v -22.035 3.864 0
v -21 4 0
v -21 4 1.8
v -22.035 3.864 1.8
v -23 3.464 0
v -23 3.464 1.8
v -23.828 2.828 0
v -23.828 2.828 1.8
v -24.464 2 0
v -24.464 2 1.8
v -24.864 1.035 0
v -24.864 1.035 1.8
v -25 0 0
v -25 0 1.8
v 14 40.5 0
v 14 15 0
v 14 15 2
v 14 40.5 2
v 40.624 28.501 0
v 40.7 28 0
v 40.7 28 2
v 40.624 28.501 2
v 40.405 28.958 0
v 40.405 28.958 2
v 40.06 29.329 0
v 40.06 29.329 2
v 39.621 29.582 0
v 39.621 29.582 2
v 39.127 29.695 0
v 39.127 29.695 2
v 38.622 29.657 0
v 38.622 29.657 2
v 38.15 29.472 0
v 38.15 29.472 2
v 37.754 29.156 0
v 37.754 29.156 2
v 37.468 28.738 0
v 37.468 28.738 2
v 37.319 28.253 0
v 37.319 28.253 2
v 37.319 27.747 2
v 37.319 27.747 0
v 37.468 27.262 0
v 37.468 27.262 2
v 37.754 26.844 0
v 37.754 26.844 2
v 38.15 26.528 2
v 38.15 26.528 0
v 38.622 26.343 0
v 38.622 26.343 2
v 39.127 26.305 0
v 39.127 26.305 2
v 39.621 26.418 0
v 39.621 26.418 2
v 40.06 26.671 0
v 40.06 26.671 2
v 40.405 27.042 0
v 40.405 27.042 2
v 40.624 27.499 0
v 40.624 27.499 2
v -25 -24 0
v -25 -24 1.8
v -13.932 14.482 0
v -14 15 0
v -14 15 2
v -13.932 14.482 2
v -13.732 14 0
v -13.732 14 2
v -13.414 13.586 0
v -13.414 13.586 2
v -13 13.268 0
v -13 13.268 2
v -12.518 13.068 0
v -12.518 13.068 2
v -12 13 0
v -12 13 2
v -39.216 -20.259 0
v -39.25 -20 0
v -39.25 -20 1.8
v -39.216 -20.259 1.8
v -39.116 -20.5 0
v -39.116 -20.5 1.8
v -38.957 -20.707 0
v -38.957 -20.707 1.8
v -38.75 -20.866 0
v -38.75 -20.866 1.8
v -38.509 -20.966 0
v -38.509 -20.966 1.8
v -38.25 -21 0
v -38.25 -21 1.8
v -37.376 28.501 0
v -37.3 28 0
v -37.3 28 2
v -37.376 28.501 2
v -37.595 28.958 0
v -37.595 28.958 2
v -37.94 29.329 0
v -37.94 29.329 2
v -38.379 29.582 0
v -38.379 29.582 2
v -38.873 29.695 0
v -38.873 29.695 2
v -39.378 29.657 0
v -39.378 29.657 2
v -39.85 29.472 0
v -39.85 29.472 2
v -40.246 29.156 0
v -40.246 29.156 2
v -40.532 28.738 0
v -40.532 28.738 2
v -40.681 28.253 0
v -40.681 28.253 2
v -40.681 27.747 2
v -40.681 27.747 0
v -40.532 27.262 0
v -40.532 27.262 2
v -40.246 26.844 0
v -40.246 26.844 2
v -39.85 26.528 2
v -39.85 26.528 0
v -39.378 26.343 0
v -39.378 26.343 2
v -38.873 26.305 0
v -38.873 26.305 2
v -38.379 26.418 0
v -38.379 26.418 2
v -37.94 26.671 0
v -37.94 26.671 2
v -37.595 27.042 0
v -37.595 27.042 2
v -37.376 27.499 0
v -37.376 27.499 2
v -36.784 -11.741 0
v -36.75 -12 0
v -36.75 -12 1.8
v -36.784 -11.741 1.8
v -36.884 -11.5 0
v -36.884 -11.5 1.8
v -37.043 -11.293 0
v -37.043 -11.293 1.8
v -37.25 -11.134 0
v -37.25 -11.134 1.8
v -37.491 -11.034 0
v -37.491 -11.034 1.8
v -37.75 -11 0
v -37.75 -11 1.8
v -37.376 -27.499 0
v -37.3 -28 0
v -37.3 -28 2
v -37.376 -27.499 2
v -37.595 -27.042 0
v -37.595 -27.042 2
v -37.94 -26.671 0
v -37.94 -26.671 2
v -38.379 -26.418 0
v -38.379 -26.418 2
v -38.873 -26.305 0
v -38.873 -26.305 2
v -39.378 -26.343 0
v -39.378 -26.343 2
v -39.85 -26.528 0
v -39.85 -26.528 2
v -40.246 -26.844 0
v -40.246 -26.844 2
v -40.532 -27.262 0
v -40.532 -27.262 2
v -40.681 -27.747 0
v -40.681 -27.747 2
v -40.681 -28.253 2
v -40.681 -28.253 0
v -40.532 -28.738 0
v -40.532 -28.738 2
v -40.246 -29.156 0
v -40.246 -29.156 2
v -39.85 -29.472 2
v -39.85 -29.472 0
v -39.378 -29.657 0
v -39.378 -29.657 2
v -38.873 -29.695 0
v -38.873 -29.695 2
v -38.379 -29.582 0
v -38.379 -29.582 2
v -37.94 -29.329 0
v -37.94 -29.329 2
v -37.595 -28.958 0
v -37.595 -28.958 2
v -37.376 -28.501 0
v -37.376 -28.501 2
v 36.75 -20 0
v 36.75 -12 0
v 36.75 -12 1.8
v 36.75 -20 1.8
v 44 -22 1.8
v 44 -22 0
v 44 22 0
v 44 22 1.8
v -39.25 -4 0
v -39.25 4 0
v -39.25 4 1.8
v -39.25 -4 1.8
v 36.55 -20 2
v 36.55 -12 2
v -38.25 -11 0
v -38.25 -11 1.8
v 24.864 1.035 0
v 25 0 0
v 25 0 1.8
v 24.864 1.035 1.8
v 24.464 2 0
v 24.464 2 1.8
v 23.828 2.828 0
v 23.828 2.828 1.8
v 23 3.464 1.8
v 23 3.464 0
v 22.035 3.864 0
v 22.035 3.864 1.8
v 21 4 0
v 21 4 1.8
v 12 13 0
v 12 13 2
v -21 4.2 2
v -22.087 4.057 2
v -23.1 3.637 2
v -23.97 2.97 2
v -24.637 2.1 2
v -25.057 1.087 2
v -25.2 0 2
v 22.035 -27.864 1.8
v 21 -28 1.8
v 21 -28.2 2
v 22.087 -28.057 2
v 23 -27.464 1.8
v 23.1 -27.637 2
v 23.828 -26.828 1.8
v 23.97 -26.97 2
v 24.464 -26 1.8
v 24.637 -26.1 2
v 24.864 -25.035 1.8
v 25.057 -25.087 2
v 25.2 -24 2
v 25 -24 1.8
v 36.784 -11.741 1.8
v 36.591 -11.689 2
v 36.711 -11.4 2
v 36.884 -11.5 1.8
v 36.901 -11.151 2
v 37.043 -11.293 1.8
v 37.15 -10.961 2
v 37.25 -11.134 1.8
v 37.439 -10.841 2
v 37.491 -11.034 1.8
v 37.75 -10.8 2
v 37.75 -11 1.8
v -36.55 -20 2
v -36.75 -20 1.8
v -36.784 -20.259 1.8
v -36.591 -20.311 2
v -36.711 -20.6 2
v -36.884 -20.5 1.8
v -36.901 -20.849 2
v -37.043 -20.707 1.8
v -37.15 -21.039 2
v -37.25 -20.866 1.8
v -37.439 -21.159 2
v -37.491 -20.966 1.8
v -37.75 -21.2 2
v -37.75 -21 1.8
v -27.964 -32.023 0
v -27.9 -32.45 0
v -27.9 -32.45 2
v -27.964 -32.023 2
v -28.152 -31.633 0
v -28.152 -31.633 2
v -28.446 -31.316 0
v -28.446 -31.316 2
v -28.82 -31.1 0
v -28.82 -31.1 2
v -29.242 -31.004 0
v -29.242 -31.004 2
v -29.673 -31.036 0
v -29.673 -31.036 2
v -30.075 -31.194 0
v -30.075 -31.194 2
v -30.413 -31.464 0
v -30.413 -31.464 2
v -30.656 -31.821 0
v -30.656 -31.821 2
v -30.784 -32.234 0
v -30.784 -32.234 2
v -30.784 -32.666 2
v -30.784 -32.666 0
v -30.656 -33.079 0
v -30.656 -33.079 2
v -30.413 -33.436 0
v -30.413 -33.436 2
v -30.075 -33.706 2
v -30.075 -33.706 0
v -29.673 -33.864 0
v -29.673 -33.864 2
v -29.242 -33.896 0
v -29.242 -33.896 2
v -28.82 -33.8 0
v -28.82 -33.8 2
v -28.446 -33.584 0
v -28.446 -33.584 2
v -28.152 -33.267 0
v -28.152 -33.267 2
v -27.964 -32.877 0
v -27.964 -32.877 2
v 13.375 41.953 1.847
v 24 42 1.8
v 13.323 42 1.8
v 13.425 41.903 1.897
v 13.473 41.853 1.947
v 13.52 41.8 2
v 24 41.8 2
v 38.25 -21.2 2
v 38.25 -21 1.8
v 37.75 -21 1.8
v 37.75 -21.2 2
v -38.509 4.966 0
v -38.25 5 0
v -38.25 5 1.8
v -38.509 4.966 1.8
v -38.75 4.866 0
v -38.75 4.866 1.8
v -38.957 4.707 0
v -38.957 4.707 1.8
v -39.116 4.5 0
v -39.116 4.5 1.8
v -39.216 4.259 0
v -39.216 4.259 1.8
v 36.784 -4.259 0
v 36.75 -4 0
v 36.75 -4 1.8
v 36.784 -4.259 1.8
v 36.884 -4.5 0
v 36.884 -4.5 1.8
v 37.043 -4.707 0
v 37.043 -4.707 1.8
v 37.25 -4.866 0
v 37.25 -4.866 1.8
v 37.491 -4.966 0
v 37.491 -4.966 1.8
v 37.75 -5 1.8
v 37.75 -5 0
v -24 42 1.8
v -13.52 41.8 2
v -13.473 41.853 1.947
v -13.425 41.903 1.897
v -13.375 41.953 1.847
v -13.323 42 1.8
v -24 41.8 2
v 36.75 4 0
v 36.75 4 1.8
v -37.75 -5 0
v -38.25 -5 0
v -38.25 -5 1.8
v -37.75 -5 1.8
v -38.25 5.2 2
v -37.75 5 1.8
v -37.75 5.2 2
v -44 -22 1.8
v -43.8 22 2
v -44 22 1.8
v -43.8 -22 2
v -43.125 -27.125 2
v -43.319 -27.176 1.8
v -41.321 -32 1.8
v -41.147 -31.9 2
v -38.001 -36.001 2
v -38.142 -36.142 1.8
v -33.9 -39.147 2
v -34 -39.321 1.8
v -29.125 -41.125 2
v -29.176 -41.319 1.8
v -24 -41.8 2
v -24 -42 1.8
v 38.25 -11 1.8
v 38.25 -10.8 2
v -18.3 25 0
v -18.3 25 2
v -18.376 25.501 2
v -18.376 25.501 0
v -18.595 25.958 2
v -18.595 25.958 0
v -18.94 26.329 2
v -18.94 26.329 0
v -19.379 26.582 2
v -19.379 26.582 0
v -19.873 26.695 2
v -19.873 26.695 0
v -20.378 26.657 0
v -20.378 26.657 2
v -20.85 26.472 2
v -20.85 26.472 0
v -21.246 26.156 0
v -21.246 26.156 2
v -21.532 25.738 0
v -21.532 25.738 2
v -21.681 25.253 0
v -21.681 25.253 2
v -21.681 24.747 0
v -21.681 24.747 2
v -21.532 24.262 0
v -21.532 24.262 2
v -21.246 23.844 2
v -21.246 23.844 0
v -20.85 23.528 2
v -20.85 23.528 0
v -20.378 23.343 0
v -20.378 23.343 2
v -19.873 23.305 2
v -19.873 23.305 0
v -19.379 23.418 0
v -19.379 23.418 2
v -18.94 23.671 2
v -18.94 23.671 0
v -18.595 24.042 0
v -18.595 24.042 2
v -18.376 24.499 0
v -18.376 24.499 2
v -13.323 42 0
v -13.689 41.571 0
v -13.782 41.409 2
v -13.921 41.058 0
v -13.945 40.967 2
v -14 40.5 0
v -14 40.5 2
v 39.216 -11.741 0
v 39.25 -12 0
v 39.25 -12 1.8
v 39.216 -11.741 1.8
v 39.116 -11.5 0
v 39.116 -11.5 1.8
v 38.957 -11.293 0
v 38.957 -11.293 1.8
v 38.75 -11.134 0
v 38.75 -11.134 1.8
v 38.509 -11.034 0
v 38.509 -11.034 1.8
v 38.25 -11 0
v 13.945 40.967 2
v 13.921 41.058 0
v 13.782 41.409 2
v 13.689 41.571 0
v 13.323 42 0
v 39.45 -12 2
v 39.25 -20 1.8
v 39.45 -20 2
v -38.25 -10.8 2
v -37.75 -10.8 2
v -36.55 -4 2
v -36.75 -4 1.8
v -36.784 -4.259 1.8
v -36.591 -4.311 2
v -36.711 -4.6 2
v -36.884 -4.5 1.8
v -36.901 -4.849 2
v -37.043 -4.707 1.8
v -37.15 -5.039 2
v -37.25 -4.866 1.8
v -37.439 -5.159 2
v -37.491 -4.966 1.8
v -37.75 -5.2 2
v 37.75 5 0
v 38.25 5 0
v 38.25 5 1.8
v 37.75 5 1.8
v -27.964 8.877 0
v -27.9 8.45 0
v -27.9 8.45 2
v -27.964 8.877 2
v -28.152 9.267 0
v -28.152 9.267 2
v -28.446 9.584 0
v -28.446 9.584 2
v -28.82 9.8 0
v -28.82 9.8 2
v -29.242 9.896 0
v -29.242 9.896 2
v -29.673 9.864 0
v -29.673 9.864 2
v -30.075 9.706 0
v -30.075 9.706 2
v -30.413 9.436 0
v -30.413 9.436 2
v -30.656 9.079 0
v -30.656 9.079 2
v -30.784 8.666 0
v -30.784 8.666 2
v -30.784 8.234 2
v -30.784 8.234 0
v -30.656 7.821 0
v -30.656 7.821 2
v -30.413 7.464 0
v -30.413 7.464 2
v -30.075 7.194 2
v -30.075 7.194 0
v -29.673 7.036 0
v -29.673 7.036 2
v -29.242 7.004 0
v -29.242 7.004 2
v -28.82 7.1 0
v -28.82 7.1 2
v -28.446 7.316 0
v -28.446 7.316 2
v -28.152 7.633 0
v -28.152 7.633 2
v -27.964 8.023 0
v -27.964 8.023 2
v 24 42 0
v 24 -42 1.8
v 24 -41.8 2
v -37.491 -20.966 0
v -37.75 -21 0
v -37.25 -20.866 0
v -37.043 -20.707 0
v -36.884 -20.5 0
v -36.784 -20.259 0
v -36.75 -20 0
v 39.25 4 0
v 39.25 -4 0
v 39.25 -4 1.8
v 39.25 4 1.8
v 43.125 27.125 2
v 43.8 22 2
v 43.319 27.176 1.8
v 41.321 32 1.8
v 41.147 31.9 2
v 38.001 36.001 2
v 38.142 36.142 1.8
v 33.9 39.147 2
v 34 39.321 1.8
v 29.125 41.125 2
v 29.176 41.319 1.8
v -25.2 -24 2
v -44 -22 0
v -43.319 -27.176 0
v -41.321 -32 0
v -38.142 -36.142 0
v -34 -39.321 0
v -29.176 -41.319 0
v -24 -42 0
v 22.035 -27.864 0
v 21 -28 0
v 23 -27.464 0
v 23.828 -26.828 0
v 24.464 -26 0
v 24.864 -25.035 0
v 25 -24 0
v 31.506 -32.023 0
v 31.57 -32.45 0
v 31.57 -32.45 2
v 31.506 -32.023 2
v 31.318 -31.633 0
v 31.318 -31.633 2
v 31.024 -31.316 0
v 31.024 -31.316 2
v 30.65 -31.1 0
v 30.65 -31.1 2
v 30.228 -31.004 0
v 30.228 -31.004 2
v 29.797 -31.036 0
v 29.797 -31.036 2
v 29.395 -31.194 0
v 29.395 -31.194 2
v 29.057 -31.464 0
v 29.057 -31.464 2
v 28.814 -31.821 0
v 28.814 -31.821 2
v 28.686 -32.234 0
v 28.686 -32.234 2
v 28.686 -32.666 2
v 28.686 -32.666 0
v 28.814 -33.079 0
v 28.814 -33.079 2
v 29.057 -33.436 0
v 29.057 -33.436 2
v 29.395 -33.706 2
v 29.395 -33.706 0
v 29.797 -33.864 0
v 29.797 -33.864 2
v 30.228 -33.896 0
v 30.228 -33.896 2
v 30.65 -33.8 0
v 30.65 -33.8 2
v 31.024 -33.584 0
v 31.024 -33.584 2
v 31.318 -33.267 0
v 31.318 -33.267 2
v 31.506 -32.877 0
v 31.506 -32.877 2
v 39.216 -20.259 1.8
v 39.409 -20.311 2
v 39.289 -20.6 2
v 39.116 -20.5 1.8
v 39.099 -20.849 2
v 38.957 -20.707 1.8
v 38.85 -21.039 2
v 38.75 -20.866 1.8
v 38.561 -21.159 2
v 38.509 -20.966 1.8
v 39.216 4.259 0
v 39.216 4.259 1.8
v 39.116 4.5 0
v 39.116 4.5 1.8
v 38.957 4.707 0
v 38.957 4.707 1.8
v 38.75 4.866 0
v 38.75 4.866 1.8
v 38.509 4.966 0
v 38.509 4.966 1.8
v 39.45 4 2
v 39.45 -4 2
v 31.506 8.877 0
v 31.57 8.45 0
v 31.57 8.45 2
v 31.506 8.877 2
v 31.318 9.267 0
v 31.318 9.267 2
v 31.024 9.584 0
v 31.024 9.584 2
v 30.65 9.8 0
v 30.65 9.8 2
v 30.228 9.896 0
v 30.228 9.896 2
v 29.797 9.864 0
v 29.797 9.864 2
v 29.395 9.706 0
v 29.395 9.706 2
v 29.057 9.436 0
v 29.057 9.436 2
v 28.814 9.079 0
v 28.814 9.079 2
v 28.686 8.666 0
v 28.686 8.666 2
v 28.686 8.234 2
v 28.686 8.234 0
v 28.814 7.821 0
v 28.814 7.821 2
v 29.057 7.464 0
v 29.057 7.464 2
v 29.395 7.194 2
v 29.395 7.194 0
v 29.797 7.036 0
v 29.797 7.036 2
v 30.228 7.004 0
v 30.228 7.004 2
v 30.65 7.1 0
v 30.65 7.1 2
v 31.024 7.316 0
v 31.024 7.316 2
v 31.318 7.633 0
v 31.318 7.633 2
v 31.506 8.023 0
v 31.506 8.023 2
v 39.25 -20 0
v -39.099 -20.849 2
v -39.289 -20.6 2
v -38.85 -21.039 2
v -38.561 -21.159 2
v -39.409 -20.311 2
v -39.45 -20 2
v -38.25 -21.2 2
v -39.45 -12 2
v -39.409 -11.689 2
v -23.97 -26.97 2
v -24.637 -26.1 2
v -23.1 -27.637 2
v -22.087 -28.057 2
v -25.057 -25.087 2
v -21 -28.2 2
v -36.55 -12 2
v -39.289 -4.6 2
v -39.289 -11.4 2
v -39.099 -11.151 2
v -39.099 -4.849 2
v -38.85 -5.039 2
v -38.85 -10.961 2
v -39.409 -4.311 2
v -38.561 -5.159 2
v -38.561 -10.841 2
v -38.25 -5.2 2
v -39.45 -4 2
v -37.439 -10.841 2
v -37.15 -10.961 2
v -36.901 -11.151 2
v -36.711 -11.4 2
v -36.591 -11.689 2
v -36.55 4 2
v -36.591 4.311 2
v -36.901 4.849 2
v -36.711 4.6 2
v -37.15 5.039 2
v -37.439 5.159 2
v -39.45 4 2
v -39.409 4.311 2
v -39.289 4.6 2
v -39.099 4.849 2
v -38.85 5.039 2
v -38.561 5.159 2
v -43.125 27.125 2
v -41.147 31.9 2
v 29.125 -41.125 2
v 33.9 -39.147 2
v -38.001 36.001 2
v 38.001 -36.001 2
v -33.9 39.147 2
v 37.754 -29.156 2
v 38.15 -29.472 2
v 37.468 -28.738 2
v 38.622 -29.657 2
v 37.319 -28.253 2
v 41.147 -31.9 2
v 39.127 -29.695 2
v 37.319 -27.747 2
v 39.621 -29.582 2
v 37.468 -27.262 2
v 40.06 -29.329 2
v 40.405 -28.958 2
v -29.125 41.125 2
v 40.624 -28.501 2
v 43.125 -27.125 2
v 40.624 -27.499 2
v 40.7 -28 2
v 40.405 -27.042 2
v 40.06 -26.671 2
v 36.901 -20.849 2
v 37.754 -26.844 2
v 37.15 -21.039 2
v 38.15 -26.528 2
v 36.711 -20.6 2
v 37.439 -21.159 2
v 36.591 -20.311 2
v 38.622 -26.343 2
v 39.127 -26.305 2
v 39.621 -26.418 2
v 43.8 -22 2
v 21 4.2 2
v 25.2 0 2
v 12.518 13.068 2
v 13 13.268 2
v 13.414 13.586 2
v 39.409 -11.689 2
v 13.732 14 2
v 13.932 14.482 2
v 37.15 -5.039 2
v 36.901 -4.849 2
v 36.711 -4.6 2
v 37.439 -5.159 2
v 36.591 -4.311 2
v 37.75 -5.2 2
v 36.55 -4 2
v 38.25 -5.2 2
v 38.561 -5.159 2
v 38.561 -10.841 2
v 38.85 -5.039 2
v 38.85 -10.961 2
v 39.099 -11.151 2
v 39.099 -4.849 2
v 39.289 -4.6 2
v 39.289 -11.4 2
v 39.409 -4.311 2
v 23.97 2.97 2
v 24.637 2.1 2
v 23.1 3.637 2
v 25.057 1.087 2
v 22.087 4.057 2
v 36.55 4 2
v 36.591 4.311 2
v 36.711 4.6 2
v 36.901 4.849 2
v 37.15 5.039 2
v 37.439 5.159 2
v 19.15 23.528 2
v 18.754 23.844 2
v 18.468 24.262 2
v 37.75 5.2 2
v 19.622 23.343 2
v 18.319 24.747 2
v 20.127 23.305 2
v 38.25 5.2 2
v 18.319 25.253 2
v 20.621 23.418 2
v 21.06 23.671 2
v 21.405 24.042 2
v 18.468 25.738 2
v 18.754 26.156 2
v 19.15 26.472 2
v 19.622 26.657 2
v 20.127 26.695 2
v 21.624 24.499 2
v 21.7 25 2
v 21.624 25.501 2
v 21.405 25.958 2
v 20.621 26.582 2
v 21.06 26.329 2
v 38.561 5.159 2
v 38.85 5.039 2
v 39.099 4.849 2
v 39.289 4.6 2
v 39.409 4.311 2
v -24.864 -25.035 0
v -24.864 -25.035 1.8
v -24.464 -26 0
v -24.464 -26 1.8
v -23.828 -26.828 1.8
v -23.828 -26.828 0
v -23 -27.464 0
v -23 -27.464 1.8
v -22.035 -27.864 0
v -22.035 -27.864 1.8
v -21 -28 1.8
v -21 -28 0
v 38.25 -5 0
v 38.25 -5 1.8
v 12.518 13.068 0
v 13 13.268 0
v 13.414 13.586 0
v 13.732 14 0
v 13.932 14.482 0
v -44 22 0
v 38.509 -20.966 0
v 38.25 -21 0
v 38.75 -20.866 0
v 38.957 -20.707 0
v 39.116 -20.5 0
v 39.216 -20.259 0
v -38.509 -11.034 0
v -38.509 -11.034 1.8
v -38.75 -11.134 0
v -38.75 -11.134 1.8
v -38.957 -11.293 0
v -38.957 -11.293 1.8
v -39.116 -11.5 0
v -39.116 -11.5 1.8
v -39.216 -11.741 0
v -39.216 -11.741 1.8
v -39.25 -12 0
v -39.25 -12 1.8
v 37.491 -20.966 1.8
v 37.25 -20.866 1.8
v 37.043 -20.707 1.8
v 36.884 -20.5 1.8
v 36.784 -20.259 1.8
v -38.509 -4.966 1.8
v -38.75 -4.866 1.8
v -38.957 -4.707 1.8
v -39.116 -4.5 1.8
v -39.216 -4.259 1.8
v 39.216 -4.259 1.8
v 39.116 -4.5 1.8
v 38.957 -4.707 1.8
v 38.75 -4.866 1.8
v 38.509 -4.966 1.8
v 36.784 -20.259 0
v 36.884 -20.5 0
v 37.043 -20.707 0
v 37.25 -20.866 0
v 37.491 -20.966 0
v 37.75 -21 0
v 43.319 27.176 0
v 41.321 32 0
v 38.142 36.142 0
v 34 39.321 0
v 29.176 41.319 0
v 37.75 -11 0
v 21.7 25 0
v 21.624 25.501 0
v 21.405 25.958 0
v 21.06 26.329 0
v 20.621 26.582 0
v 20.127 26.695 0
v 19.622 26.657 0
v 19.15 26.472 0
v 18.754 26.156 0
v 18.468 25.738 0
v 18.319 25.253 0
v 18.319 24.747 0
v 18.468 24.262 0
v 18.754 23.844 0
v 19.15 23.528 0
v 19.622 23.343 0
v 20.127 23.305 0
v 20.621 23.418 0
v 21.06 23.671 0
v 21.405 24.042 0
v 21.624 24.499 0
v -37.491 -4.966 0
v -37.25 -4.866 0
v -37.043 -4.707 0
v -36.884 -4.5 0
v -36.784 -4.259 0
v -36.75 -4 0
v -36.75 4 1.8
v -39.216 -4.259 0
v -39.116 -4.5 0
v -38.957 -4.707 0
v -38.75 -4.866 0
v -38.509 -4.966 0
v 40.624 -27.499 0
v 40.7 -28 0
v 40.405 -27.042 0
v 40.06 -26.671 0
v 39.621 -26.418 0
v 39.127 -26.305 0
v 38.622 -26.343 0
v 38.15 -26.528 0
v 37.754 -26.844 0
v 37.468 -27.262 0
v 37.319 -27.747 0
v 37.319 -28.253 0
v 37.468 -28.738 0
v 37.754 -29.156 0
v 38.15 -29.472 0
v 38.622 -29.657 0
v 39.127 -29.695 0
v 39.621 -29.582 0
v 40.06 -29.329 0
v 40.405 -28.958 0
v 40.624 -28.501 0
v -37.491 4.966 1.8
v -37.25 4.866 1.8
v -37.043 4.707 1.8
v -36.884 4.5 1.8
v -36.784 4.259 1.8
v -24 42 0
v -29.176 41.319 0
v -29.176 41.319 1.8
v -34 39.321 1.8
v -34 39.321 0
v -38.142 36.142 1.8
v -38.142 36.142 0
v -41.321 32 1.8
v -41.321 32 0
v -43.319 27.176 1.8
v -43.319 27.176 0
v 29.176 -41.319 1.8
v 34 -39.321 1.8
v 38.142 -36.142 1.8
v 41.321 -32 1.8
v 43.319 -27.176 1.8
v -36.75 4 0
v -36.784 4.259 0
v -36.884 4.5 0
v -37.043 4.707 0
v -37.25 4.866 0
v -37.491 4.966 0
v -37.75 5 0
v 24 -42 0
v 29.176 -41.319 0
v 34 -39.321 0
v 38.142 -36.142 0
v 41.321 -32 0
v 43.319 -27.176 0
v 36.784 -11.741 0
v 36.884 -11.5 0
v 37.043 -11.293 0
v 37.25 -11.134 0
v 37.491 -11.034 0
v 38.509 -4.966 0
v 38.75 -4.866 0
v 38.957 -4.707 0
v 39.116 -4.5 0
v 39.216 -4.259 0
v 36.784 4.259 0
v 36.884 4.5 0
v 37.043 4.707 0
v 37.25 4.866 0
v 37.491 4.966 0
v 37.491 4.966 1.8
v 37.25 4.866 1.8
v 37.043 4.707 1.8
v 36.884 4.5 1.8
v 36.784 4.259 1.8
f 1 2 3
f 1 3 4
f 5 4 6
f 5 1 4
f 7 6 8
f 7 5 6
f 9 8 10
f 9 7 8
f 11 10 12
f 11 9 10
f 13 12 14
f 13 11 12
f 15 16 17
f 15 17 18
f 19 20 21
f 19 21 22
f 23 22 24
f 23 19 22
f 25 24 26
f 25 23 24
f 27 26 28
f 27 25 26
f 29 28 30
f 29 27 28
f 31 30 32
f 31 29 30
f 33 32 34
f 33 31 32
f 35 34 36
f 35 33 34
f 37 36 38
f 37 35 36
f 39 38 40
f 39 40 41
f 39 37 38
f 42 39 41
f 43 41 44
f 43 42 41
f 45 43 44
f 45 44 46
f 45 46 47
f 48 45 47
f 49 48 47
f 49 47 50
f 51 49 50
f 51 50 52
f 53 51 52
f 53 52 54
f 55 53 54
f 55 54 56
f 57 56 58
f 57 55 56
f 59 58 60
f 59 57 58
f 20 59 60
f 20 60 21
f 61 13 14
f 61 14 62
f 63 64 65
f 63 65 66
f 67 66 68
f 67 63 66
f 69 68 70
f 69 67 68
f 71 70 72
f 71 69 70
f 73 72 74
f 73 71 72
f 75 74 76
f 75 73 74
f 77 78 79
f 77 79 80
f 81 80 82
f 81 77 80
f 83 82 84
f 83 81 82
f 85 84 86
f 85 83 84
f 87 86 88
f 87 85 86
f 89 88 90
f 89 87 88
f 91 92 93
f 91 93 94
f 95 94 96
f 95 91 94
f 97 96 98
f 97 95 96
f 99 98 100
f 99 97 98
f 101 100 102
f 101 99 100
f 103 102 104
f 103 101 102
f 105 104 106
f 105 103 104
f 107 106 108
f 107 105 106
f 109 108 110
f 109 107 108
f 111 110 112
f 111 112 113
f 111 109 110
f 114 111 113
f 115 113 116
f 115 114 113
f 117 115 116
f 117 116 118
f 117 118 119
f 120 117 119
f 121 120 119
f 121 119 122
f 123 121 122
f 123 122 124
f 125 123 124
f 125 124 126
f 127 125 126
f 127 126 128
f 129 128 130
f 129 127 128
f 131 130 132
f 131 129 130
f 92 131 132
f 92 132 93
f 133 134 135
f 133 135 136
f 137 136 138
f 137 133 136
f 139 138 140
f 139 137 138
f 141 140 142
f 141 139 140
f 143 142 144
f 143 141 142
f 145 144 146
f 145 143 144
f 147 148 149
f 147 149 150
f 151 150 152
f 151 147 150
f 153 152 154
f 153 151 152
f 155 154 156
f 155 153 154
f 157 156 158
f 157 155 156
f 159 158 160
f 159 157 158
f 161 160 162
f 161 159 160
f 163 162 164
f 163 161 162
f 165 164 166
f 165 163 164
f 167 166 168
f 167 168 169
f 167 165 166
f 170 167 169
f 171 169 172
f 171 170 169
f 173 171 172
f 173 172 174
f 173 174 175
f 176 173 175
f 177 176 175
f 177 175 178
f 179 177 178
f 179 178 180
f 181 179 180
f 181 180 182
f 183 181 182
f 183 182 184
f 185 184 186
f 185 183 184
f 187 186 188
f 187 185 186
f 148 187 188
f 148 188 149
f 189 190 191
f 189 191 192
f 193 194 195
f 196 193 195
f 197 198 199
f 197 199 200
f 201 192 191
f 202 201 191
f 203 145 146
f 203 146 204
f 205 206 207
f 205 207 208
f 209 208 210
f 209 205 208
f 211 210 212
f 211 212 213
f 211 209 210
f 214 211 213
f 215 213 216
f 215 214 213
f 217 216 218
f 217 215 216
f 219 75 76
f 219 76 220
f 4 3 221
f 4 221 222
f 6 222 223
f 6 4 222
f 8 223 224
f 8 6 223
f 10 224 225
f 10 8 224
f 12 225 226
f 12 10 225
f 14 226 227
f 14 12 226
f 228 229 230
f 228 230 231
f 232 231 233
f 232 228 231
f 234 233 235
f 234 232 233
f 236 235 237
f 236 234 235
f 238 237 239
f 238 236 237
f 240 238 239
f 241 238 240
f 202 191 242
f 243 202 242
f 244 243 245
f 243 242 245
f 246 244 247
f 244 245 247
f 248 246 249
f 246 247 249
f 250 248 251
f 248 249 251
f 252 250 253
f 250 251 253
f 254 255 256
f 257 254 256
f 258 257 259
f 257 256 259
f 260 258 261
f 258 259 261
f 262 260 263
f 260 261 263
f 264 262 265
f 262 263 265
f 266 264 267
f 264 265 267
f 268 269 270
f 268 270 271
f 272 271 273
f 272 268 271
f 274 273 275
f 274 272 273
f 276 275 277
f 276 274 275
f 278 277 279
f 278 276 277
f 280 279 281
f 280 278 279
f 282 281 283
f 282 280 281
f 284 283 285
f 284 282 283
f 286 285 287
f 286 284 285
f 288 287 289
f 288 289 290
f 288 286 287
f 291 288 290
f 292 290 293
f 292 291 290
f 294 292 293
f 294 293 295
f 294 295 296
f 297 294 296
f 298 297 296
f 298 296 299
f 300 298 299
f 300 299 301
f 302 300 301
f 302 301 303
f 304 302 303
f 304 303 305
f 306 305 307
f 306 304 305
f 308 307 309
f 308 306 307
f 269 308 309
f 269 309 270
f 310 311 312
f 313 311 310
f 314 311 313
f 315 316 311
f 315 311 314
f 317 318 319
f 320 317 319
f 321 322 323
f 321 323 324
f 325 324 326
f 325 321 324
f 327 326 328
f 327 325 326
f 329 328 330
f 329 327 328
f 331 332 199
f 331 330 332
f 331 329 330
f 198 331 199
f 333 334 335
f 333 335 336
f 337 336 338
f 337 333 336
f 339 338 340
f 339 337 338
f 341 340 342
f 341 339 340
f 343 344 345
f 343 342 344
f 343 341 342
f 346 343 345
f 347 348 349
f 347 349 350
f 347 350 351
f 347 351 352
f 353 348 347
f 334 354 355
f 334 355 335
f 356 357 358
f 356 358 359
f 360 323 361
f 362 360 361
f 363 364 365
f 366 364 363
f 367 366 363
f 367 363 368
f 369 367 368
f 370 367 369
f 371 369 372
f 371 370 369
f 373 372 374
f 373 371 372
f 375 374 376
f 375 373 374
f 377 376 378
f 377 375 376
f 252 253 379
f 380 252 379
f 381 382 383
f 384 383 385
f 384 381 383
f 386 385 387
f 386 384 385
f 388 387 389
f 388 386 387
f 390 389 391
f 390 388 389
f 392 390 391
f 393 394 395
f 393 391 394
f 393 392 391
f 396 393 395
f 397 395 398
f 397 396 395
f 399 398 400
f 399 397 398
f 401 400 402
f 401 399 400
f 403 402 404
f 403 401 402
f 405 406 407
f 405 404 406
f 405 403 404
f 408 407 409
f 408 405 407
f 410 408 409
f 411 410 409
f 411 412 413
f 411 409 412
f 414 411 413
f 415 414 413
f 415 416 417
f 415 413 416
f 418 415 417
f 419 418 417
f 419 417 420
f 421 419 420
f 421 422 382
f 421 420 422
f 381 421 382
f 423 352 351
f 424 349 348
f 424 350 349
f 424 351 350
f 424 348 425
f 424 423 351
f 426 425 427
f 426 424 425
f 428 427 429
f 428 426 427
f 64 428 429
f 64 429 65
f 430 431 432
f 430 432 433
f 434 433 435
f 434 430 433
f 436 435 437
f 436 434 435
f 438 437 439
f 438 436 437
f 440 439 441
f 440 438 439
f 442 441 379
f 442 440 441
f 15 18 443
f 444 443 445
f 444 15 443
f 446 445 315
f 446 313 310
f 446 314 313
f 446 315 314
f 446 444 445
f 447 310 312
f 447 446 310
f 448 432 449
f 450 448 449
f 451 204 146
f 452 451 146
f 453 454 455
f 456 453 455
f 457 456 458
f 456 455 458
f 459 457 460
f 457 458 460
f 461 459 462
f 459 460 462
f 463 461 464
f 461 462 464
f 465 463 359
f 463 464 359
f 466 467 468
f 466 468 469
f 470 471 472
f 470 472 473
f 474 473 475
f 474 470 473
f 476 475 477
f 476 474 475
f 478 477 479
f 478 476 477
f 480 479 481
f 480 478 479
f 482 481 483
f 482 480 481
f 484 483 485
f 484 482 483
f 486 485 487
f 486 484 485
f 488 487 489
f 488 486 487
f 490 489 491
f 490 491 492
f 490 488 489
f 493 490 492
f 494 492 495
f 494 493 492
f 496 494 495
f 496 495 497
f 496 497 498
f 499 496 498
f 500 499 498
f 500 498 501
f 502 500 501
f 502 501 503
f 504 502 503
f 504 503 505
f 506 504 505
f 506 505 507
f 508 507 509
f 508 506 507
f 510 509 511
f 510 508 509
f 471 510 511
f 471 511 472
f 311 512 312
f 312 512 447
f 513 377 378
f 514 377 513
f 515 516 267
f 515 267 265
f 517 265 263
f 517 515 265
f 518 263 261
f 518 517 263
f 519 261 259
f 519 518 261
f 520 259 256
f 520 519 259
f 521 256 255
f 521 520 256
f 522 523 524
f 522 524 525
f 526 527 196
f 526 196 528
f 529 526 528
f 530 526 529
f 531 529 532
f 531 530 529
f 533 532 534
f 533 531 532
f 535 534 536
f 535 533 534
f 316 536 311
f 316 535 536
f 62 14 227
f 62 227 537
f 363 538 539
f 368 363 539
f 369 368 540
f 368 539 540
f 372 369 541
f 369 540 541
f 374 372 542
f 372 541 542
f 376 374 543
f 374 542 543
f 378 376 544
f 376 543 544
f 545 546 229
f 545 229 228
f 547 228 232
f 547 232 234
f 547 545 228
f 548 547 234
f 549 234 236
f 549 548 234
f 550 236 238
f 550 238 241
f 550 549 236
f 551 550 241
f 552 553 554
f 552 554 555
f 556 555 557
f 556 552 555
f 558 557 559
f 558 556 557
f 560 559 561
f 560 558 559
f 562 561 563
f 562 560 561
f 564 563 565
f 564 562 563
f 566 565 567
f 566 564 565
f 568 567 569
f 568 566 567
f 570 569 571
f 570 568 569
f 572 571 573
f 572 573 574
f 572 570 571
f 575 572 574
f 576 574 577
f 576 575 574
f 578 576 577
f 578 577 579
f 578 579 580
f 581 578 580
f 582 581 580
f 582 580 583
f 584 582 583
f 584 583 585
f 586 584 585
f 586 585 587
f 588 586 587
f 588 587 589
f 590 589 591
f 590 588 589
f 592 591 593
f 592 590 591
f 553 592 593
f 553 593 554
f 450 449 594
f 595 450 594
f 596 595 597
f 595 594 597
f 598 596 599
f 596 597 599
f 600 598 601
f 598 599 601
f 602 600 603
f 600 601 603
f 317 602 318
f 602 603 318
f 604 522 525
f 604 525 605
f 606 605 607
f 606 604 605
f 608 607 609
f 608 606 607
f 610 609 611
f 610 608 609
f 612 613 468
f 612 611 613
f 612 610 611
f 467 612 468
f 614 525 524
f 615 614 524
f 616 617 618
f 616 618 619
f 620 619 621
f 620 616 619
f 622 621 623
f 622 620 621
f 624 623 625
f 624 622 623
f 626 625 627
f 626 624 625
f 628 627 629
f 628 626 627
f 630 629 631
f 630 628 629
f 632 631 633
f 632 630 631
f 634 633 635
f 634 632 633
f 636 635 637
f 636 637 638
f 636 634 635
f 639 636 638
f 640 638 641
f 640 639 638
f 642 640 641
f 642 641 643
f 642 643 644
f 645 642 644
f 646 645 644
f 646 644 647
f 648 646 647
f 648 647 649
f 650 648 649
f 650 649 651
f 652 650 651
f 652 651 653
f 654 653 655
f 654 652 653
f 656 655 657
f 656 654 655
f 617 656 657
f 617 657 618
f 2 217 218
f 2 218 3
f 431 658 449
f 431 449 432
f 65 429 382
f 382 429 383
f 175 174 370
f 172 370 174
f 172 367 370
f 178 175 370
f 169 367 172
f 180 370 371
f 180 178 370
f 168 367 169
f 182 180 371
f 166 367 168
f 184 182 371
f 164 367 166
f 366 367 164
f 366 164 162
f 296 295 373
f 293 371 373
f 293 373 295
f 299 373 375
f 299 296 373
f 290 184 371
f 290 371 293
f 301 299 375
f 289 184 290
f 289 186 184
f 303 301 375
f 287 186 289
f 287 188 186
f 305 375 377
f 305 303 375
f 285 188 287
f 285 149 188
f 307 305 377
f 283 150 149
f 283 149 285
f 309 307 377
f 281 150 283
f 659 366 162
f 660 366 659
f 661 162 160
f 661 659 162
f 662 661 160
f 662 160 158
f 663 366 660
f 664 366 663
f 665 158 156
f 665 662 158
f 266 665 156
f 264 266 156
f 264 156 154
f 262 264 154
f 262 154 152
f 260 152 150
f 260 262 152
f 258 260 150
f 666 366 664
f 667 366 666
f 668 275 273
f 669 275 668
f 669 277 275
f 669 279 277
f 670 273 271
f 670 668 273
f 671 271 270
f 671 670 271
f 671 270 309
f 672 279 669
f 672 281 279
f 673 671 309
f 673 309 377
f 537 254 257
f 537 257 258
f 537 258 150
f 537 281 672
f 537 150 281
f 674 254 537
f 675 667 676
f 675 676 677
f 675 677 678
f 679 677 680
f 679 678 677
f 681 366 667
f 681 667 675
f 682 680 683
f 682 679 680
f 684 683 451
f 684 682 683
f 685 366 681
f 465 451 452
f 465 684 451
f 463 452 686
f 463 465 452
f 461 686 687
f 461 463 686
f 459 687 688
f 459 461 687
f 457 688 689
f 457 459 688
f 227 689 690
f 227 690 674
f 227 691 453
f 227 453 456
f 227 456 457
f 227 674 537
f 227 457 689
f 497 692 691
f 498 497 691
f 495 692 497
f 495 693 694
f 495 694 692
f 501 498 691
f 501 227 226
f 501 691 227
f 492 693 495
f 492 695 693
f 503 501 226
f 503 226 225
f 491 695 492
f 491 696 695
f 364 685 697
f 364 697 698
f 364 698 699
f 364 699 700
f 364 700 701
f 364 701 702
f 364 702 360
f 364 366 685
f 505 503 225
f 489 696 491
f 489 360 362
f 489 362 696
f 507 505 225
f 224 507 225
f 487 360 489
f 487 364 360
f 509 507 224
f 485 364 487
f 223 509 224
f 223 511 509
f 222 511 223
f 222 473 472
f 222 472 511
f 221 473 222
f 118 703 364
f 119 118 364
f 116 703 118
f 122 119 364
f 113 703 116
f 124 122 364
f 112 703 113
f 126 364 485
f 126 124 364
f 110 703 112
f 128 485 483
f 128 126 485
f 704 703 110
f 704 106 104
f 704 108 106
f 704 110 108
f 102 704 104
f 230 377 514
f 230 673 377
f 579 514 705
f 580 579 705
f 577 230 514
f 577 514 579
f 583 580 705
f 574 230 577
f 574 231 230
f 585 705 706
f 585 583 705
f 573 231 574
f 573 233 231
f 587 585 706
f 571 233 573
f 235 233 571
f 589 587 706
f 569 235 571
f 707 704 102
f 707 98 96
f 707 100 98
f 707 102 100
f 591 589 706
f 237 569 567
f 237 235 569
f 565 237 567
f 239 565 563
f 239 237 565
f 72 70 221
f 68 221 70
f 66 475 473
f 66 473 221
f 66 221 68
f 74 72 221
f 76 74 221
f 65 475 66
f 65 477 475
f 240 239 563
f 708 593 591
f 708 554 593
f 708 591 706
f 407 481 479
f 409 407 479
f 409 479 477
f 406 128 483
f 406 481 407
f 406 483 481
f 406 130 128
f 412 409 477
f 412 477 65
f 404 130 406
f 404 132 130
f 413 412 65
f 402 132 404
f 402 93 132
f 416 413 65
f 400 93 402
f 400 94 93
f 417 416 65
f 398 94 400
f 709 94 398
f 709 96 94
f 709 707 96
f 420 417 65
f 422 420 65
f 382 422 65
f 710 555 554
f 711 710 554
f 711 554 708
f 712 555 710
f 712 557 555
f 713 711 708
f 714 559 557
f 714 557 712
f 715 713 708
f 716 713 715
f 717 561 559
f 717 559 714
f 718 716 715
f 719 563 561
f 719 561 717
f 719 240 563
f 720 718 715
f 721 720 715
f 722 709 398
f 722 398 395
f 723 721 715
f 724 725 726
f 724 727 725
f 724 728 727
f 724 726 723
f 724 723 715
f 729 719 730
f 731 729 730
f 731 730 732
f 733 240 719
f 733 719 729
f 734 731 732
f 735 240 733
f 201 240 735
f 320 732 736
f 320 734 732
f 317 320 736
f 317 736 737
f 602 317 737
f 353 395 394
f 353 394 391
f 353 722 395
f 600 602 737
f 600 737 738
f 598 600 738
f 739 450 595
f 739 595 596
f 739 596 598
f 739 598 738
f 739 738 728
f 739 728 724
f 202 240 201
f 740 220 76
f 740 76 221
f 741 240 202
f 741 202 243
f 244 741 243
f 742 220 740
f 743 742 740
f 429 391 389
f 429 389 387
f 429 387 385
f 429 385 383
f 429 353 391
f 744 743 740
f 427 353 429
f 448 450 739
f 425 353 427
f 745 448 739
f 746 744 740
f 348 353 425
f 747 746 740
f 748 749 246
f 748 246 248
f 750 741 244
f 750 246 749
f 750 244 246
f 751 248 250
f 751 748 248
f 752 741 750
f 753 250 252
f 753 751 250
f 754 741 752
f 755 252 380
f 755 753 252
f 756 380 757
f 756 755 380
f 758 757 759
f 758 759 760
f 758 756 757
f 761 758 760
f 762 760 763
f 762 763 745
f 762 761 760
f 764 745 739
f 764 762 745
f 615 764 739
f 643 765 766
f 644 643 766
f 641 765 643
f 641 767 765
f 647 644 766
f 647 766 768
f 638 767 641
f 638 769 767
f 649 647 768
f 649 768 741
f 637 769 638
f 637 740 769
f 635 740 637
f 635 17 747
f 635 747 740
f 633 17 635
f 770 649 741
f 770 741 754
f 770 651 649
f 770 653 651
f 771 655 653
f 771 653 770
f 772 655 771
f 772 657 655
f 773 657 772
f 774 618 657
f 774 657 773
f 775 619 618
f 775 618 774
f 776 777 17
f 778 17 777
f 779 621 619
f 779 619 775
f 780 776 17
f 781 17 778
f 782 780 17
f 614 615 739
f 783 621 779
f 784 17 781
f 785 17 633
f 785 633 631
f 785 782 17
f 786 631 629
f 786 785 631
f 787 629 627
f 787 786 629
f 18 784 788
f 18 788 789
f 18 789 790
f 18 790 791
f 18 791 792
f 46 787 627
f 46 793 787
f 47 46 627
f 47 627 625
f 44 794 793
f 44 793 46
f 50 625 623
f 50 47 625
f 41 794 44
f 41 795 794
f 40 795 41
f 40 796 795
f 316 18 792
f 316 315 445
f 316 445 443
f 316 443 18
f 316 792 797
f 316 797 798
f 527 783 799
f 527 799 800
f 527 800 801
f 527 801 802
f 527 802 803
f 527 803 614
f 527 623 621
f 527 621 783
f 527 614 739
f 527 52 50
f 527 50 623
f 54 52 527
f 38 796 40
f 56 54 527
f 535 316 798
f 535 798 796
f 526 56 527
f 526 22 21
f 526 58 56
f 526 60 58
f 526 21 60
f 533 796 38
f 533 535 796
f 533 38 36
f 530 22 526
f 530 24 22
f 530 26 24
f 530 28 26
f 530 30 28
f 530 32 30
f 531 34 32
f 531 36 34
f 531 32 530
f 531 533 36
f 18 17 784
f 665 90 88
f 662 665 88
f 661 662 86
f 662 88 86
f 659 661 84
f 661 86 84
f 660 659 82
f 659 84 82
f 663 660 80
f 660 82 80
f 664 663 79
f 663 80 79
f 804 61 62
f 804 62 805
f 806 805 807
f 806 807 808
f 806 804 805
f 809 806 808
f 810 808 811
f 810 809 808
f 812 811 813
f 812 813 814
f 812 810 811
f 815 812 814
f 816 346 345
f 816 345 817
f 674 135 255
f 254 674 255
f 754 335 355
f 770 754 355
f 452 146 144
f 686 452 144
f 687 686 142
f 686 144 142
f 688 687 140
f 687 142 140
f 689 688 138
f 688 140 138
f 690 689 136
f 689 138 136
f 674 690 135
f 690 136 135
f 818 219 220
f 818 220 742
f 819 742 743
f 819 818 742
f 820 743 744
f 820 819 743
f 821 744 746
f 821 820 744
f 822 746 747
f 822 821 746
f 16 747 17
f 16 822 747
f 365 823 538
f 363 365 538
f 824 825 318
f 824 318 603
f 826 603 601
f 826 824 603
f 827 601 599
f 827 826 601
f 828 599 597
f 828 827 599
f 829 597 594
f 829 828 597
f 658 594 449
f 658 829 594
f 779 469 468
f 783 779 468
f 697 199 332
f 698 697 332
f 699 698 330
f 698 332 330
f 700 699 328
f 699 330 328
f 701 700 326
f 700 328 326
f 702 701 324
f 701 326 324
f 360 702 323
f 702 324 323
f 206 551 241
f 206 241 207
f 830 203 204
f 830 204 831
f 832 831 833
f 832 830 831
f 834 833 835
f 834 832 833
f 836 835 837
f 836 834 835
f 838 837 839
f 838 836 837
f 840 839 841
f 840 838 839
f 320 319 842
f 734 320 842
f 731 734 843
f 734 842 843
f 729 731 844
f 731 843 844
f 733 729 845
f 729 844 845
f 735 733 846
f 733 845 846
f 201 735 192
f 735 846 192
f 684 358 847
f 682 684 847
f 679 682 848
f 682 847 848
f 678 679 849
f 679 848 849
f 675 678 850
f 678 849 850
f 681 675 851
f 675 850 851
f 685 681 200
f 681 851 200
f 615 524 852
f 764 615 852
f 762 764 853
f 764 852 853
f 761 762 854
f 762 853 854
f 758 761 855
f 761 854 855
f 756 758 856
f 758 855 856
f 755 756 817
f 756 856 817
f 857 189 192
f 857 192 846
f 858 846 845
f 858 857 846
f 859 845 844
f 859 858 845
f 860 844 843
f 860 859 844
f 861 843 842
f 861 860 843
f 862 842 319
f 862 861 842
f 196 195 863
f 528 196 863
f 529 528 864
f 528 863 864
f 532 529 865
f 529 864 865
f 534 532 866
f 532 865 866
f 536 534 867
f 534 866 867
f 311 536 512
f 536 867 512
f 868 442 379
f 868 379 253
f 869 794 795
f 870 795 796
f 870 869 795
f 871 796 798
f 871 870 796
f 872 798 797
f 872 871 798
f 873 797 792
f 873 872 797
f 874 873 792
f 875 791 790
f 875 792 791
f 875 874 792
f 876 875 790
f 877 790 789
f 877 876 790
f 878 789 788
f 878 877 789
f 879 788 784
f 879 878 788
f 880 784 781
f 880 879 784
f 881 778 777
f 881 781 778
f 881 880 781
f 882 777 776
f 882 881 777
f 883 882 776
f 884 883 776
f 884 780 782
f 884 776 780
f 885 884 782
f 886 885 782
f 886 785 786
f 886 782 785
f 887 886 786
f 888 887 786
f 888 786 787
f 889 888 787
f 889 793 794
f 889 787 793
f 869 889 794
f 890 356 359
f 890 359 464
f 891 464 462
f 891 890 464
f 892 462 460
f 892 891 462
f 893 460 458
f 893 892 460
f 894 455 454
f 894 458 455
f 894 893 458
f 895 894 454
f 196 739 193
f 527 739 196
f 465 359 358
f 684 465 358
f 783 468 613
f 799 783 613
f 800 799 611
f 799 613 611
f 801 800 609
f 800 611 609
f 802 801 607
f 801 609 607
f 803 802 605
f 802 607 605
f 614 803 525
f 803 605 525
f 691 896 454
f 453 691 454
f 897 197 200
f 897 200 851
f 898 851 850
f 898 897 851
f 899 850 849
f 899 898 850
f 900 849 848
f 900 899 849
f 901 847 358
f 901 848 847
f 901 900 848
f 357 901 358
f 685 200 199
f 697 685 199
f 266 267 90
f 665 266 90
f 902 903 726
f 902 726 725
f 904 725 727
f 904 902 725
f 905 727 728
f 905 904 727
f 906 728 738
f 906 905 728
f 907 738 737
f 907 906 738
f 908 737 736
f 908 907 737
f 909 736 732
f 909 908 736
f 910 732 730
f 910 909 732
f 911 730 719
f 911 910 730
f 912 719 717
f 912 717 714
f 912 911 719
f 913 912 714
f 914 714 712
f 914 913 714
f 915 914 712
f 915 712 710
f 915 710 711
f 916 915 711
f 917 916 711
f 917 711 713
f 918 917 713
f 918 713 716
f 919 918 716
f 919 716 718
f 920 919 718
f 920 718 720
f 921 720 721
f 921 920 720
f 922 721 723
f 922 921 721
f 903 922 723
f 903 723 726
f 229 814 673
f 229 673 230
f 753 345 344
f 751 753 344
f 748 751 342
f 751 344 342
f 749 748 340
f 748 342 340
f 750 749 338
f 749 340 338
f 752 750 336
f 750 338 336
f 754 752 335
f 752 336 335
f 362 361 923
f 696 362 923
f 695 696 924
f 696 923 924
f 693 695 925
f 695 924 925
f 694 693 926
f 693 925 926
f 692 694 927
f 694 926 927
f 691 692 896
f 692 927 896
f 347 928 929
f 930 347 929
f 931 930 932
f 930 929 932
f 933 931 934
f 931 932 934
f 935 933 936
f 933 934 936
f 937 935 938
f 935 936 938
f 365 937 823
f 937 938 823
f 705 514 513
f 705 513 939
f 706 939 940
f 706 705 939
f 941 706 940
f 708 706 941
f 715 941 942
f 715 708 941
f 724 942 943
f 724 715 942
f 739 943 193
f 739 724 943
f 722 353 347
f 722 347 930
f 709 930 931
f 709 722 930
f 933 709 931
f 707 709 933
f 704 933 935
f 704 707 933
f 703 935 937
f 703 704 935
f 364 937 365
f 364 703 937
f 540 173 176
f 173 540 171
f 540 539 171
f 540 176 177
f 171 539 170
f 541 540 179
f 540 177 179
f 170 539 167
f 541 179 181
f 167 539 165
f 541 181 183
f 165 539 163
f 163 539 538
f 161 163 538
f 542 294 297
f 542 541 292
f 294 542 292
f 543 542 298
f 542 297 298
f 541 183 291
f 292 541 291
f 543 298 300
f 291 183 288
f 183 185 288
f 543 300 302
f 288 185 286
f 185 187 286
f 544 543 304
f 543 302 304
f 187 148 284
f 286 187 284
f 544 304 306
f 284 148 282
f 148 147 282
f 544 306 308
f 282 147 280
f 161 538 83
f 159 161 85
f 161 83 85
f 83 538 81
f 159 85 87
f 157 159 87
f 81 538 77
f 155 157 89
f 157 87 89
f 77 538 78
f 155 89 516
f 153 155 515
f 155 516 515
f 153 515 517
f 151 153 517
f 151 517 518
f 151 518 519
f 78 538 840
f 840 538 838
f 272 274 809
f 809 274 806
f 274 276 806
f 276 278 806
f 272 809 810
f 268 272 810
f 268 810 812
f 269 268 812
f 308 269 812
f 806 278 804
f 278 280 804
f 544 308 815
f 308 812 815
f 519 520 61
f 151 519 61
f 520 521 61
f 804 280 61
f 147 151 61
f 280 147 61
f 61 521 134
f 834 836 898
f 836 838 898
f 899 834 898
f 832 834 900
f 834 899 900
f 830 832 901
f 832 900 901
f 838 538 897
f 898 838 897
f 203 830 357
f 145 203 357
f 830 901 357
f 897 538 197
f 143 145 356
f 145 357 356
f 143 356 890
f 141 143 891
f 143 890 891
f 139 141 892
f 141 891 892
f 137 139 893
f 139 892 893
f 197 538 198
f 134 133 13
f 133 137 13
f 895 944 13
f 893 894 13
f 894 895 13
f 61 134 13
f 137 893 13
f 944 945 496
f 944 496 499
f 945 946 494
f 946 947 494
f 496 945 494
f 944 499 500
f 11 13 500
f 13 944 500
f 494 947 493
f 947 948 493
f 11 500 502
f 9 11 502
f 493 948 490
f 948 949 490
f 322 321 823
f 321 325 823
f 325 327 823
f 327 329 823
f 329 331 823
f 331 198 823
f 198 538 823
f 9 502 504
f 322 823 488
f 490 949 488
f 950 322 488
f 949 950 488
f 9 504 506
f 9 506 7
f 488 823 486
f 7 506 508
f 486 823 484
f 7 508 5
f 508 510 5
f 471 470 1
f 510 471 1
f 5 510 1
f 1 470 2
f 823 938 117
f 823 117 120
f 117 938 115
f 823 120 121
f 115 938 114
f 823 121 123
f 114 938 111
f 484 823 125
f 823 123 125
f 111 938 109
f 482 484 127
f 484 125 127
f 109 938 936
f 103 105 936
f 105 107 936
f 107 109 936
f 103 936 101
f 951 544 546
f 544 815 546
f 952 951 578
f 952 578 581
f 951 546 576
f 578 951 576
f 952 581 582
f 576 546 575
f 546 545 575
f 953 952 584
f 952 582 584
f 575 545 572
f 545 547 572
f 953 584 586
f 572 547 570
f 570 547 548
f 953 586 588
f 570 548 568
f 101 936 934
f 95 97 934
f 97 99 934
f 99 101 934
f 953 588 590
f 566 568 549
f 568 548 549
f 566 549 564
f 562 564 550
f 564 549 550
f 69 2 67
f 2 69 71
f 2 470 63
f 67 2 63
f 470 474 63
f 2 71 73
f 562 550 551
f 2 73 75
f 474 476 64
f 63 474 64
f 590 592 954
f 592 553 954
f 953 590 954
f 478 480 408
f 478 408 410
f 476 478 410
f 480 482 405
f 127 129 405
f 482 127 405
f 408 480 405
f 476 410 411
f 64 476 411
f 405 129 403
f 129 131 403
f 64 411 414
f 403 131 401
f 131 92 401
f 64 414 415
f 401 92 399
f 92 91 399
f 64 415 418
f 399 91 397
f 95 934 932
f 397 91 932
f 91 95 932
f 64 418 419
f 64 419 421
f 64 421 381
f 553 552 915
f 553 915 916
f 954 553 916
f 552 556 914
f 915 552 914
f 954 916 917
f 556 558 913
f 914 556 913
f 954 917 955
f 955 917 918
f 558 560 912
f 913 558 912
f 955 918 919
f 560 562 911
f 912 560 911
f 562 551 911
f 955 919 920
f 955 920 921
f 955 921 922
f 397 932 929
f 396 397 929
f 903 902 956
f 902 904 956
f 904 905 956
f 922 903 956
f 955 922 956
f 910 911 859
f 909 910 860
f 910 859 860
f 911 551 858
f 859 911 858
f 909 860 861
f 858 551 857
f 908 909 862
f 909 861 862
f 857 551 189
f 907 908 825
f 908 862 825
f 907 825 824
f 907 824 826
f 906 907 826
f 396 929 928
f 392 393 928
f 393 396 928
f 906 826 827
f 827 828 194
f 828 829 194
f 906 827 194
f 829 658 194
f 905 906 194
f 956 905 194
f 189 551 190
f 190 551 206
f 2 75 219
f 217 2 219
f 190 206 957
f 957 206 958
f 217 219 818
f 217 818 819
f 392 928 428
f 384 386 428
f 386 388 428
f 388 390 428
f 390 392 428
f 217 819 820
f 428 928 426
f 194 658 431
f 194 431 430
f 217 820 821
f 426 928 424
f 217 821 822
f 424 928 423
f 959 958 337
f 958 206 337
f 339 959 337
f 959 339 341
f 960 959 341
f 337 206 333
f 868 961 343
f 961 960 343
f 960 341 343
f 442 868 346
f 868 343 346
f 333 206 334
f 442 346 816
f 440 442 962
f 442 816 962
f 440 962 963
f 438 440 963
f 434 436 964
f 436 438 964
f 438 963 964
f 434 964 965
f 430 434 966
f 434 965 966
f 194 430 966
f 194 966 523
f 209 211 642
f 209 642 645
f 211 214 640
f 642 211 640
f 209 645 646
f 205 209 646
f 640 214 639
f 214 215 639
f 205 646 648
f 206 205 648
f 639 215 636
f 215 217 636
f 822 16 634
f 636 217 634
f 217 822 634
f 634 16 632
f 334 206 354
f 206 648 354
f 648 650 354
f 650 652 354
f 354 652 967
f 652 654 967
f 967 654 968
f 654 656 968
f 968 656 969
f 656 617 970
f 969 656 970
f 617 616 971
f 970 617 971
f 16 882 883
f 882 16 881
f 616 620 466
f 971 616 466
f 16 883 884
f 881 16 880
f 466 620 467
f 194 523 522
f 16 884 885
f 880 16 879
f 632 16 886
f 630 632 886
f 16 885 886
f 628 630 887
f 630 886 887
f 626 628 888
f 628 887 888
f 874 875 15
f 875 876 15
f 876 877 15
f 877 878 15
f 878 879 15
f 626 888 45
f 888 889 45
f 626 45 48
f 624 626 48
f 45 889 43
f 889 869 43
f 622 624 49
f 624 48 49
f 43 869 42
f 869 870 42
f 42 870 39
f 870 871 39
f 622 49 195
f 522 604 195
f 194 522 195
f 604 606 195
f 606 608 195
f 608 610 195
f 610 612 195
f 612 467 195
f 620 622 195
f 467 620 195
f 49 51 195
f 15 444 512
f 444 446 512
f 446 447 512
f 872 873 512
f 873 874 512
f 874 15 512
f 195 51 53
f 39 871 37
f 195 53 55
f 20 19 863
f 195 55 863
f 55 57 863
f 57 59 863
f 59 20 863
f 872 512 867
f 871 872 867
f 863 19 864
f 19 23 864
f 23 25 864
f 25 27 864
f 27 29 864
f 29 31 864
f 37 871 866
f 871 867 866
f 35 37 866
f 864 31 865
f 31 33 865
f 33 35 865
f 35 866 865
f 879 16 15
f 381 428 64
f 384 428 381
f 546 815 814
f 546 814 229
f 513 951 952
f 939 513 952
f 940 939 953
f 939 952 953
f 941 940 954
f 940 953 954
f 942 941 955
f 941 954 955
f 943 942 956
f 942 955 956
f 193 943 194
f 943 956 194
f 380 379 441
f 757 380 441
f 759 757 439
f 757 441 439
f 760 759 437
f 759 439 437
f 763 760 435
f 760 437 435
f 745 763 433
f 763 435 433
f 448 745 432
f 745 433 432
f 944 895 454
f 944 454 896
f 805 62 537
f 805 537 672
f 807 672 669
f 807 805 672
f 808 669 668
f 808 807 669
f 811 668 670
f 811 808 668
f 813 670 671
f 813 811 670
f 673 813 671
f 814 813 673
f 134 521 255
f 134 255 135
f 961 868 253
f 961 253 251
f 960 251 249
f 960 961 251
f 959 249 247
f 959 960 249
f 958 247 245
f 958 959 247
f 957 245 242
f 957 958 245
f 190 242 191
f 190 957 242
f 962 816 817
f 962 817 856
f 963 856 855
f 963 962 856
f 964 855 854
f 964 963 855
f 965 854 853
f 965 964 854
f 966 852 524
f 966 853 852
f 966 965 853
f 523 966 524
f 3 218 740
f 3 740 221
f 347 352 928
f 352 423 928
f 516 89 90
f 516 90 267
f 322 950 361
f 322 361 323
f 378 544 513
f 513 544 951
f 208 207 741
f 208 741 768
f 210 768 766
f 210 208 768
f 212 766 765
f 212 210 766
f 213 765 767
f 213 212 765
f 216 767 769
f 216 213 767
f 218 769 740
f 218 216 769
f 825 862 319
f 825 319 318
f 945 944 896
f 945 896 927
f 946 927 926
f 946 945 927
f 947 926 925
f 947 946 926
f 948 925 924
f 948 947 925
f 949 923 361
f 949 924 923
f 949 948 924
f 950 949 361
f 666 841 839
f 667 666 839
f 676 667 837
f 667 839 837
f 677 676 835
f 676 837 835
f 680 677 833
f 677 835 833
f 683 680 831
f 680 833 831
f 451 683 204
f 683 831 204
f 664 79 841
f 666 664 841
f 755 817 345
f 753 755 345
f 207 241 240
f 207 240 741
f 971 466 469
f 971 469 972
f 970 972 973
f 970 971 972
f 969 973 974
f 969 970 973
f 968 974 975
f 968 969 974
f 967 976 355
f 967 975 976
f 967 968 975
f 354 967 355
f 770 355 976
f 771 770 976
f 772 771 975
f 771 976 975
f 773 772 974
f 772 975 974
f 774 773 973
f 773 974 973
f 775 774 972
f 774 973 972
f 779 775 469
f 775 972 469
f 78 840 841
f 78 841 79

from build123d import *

# Parameters (mm, degrees)
SKETCH_219_R           = 1.45
SKETCH_219_R_2         = 1.7
EXTRUDE_2_DEPTH        = 2
CUT_EXTRUDE_641_DEPTH  = 61.860496219
CUT_EXTRUDE_1124_DEPTH = 61.860496219
CHAMFER_C0_2_SIZE      = 0.2
CUT_EXTRUDE_2015_DEPTH = 61.860496219
SKETCH_M3_R            = 1.7
CUT_EXTRUDE_2116_DEPTH = 61.860496219


with BuildPart() as part:
    # Sketch 219 → 屏幕承架厚2 (new body)
    with BuildSketch(Plane.XY):
        with BuildLine():
            Line((-24, -42), (24, -42))
            ThreePointArc((24, -42), (38.142135624, -36.142135624), (44, -22))
            Line((44, -22), (44, 22))
            ThreePointArc((44, 22), (38.142135624, 36.142135624), (24, 42))
            Line((24, 42), (-24, 42))
            ThreePointArc((-24, 42), (-38.142135624, 36.142135624), (-44, 22))
            Line((-44, 22), (-44, -22))
            ThreePointArc((-44, -22), (-38.142135624, -36.142135624), (-24, -42))
        make_face()
        with Locations((-29.35, 8.45)):
            Circle(SKETCH_219_R, mode=Mode.SUBTRACT)
        with Locations((-29.35, -32.45)):
            Circle(SKETCH_219_R, mode=Mode.SUBTRACT)
        with Locations((30.12, 8.45)):
            Circle(SKETCH_219_R, mode=Mode.SUBTRACT)
        with Locations((30.12, -32.45)):
            Circle(SKETCH_219_R, mode=Mode.SUBTRACT)
        with Locations((-39, -28)):
            Circle(SKETCH_219_R_2, mode=Mode.SUBTRACT)
        with Locations((-39, 28)):
            Circle(SKETCH_219_R_2, mode=Mode.SUBTRACT)
        with Locations((39, -28)):
            Circle(SKETCH_219_R_2, mode=Mode.SUBTRACT)
        with Locations((39, 28)):
            Circle(SKETCH_219_R_2, mode=Mode.SUBTRACT)
        with BuildLine():
            Line((-21, -28), (21, -28))
            ThreePointArc((21, -28), (23.828427125, -26.828427125), (25, -24))
            Line((25, -24), (25, 0))
            ThreePointArc((25, 0), (23.828427125, 2.828427125), (21, 4))
            Line((21, 4), (-21, 4))
            ThreePointArc((-21, 4), (-23.828427125, 2.828427125), (-25, 0))
            Line((-25, 0), (-25, -24))
            ThreePointArc((-25, -24), (-23.828427125, -26.828427125), (-21, -28))
        make_face(mode=Mode.SUBTRACT)
    extrude(amount=EXTRUDE_2_DEPTH)

    # 摄像板可换安装区26乘25 → Cut-Extrude 641 (cut, through all)
    with BuildSketch(Plane.XY):
        with BuildLine():
            Line((-11, 17.5), (11, 17.5))
            ThreePointArc((11, 17.5), (12.414213562, 18.085786438), (13, 19.5))
            Line((13, 19.5), (13, 40.5))
            ThreePointArc((13, 40.5), (12.414213562, 41.914213562), (11, 42.5))
            Line((11, 42.5), (-11, 42.5))
            ThreePointArc((-11, 42.5), (-12.414213562, 41.914213562), (-13, 40.5))
            Line((-13, 40.5), (-13, 19.5))
            ThreePointArc((-13, 19.5), (-12.414213562, 18.085786438), (-11, 17.5))
        make_face()
    extrude(amount=CUT_EXTRUDE_641_DEPTH, mode=Mode.SUBTRACT)

    # Sketch 697 → Cut-Extrude 1124 (cut, through all)
    with BuildSketch(Plane.XY):
        with BuildLine():
            Line((-38.25, -21), (-37.75, -21))
            ThreePointArc((-37.75, -21), (-37.042893219, -20.707106781), (-36.75, -20))
            Line((-36.75, -20), (-36.75, -12))
            ThreePointArc((-36.75, -12), (-37.042893219, -11.292893219), (-37.75, -11))
            Line((-37.75, -11), (-38.25, -11))
            ThreePointArc((-38.25, -11), (-38.957106781, -11.292893219), (-39.25, -12))
            Line((-39.25, -12), (-39.25, -20))
            ThreePointArc((-39.25, -20), (-38.957106781, -20.707106781), (-38.25, -21))
        make_face()
        with BuildLine():
            Line((-38.25, -5), (-37.75, -5))
            ThreePointArc((-37.75, -5), (-37.042893219, -4.707106781), (-36.75, -4))
            Line((-36.75, -4), (-36.75, 4))
            ThreePointArc((-36.75, 4), (-37.042893219, 4.707106781), (-37.75, 5))
            Line((-37.75, 5), (-38.25, 5))
            ThreePointArc((-38.25, 5), (-38.957106781, 4.707106781), (-39.25, 4))
            Line((-39.25, 4), (-39.25, -4))
            ThreePointArc((-39.25, -4), (-38.957106781, -4.707106781), (-38.25, -5))
        make_face()
        with BuildLine():
            Line((37.75, -21), (38.25, -21))
            ThreePointArc((38.25, -21), (38.957106781, -20.707106781), (39.25, -20))
            Line((39.25, -20), (39.25, -12))
            ThreePointArc((39.25, -12), (38.957106781, -11.292893219), (38.25, -11))
            Line((38.25, -11), (37.75, -11))
            ThreePointArc((37.75, -11), (37.042893219, -11.292893219), (36.75, -12))
            Line((36.75, -12), (36.75, -20))
            ThreePointArc((36.75, -20), (37.042893219, -20.707106781), (37.75, -21))
        make_face()
        with BuildLine():
            Line((37.75, -5), (38.25, -5))
            ThreePointArc((38.25, -5), (38.957106781, -4.707106781), (39.25, -4))
            Line((39.25, -4), (39.25, 4))
            ThreePointArc((39.25, 4), (38.957106781, 4.707106781), (38.25, 5))
            Line((38.25, 5), (37.75, 5))
            ThreePointArc((37.75, 5), (37.042893219, 4.707106781), (36.75, 4))
            Line((36.75, 4), (36.75, -4))
            ThreePointArc((36.75, -4), (37.042893219, -4.707106781), (37.75, -5))
        make_face()
    extrude(amount=CUT_EXTRUDE_1124_DEPTH, mode=Mode.SUBTRACT)

    # 非功能外缘倒角_C0.2
    chamfer_c0_2_edges = [part.edges().sort_by_distance(p)[0] for p in [
        (38.142135624, -36.142135624, 2),
        (-38.957106781, -4.707106781, 2),
        (-38, -5, 2),
        (-37.042893219, -4.707106781, 2),
        (-36.75, 0, 2),
        (-37.042893219, 4.707106781, 2),
        (-38, 5, 2),
        (-38.957106781, 4.707106781, 2),
        (-39.25, 0, 2),
        (37.042893219, -20.707106781, 2),
        (38, -21, 2),
        (38.957106781, -20.707106781, 2),
        (39.25, -16, 2),
        (38.957106781, -11.292893219, 2),
        (38, -11, 2),
        (37.042893219, -11.292893219, 2),
        (36.75, -16, 2),
        (44, 0, 2),
        (37.042893219, -4.707106781, 2),
        (38, -5, 2),
        (38.957106781, -4.707106781, 2),
        (39.25, 0, 2),
        (38.957106781, 4.707106781, 2),
        (38, 5, 2),
        (37.042893219, 4.707106781, 2),
        (36.75, 0, 2),
        (-38.957106781, -20.707106781, 2),
        (-38, -21, 2),
        (-37.042893219, -20.707106781, 2),
        (-36.75, -16, 2),
        (-37.042893219, -11.292893219, 2),
        (-38, -11, 2),
        (-38.957106781, -11.292893219, 2),
        (-39.25, -16, 2),
        (38.142135624, 36.142135624, 2),
        (18.161437828, 42, 2),
        (-38.142135624, 36.142135624, 2),
        (-23.828427125, -26.828427125, 2),
        (0, -28, 2),
        (23.828427125, -26.828427125, 2),
        (25, -12, 2),
        (23.828427125, 2.828427125, 2),
        (0, 4, 2),
        (-23.828427125, 2.828427125, 2),
        (-44, 0, 2),
        (-25, -12, 2),
        (-38.142135624, -36.142135624, 2),
        (-18.161437828, 42, 2),
        (0, -42, 2),
        (12.822875656, 41.322875656, 2),
        (-12.822875656, 41.322875656, 2),
        (-13, 30, 2),
        (-12.414213562, 18.085786438, 2),
        (0, 17.5, 2),
        (12.414213562, 18.085786438, 2),
        (13, 30, 2),
    ]]
    chamfer(chamfer_c0_2_edges, length=CHAMFER_C0_2_SIZE)

    # 相机螺母与后插座避空28乘29_5 → Cut-Extrude 2015 (cut, through all)
    with BuildSketch(Plane.XY):
        with BuildLine():
            Line((-12, 13), (12, 13))
            ThreePointArc((12, 13), (13.414213562, 13.585786438), (14, 15))
            Line((14, 15), (14, 40.5))
            ThreePointArc((14, 40.5), (13.414213562, 41.914213562), (12, 42.5))
            Line((12, 42.5), (-12, 42.5))
            ThreePointArc((-12, 42.5), (-13.414213562, 41.914213562), (-14, 40.5))
            Line((-14, 40.5), (-14, 15))
            ThreePointArc((-14, 15), (-13.414213562, 13.585786438), (-12, 13))
        make_face()
    extrude(amount=CUT_EXTRUDE_2015_DEPTH, mode=Mode.SUBTRACT)

    # 相机托架双M3连接孔 → Cut-Extrude 2116 (cut, through all)
    with BuildSketch(Plane.XY):
        with Locations((-20, 25)):
            Circle(SKETCH_M3_R)
        with Locations((20, 25)):
            Circle(SKETCH_M3_R)
    extrude(amount=CUT_EXTRUDE_2116_DEPTH, mode=Mode.SUBTRACT)


solid = part.part
